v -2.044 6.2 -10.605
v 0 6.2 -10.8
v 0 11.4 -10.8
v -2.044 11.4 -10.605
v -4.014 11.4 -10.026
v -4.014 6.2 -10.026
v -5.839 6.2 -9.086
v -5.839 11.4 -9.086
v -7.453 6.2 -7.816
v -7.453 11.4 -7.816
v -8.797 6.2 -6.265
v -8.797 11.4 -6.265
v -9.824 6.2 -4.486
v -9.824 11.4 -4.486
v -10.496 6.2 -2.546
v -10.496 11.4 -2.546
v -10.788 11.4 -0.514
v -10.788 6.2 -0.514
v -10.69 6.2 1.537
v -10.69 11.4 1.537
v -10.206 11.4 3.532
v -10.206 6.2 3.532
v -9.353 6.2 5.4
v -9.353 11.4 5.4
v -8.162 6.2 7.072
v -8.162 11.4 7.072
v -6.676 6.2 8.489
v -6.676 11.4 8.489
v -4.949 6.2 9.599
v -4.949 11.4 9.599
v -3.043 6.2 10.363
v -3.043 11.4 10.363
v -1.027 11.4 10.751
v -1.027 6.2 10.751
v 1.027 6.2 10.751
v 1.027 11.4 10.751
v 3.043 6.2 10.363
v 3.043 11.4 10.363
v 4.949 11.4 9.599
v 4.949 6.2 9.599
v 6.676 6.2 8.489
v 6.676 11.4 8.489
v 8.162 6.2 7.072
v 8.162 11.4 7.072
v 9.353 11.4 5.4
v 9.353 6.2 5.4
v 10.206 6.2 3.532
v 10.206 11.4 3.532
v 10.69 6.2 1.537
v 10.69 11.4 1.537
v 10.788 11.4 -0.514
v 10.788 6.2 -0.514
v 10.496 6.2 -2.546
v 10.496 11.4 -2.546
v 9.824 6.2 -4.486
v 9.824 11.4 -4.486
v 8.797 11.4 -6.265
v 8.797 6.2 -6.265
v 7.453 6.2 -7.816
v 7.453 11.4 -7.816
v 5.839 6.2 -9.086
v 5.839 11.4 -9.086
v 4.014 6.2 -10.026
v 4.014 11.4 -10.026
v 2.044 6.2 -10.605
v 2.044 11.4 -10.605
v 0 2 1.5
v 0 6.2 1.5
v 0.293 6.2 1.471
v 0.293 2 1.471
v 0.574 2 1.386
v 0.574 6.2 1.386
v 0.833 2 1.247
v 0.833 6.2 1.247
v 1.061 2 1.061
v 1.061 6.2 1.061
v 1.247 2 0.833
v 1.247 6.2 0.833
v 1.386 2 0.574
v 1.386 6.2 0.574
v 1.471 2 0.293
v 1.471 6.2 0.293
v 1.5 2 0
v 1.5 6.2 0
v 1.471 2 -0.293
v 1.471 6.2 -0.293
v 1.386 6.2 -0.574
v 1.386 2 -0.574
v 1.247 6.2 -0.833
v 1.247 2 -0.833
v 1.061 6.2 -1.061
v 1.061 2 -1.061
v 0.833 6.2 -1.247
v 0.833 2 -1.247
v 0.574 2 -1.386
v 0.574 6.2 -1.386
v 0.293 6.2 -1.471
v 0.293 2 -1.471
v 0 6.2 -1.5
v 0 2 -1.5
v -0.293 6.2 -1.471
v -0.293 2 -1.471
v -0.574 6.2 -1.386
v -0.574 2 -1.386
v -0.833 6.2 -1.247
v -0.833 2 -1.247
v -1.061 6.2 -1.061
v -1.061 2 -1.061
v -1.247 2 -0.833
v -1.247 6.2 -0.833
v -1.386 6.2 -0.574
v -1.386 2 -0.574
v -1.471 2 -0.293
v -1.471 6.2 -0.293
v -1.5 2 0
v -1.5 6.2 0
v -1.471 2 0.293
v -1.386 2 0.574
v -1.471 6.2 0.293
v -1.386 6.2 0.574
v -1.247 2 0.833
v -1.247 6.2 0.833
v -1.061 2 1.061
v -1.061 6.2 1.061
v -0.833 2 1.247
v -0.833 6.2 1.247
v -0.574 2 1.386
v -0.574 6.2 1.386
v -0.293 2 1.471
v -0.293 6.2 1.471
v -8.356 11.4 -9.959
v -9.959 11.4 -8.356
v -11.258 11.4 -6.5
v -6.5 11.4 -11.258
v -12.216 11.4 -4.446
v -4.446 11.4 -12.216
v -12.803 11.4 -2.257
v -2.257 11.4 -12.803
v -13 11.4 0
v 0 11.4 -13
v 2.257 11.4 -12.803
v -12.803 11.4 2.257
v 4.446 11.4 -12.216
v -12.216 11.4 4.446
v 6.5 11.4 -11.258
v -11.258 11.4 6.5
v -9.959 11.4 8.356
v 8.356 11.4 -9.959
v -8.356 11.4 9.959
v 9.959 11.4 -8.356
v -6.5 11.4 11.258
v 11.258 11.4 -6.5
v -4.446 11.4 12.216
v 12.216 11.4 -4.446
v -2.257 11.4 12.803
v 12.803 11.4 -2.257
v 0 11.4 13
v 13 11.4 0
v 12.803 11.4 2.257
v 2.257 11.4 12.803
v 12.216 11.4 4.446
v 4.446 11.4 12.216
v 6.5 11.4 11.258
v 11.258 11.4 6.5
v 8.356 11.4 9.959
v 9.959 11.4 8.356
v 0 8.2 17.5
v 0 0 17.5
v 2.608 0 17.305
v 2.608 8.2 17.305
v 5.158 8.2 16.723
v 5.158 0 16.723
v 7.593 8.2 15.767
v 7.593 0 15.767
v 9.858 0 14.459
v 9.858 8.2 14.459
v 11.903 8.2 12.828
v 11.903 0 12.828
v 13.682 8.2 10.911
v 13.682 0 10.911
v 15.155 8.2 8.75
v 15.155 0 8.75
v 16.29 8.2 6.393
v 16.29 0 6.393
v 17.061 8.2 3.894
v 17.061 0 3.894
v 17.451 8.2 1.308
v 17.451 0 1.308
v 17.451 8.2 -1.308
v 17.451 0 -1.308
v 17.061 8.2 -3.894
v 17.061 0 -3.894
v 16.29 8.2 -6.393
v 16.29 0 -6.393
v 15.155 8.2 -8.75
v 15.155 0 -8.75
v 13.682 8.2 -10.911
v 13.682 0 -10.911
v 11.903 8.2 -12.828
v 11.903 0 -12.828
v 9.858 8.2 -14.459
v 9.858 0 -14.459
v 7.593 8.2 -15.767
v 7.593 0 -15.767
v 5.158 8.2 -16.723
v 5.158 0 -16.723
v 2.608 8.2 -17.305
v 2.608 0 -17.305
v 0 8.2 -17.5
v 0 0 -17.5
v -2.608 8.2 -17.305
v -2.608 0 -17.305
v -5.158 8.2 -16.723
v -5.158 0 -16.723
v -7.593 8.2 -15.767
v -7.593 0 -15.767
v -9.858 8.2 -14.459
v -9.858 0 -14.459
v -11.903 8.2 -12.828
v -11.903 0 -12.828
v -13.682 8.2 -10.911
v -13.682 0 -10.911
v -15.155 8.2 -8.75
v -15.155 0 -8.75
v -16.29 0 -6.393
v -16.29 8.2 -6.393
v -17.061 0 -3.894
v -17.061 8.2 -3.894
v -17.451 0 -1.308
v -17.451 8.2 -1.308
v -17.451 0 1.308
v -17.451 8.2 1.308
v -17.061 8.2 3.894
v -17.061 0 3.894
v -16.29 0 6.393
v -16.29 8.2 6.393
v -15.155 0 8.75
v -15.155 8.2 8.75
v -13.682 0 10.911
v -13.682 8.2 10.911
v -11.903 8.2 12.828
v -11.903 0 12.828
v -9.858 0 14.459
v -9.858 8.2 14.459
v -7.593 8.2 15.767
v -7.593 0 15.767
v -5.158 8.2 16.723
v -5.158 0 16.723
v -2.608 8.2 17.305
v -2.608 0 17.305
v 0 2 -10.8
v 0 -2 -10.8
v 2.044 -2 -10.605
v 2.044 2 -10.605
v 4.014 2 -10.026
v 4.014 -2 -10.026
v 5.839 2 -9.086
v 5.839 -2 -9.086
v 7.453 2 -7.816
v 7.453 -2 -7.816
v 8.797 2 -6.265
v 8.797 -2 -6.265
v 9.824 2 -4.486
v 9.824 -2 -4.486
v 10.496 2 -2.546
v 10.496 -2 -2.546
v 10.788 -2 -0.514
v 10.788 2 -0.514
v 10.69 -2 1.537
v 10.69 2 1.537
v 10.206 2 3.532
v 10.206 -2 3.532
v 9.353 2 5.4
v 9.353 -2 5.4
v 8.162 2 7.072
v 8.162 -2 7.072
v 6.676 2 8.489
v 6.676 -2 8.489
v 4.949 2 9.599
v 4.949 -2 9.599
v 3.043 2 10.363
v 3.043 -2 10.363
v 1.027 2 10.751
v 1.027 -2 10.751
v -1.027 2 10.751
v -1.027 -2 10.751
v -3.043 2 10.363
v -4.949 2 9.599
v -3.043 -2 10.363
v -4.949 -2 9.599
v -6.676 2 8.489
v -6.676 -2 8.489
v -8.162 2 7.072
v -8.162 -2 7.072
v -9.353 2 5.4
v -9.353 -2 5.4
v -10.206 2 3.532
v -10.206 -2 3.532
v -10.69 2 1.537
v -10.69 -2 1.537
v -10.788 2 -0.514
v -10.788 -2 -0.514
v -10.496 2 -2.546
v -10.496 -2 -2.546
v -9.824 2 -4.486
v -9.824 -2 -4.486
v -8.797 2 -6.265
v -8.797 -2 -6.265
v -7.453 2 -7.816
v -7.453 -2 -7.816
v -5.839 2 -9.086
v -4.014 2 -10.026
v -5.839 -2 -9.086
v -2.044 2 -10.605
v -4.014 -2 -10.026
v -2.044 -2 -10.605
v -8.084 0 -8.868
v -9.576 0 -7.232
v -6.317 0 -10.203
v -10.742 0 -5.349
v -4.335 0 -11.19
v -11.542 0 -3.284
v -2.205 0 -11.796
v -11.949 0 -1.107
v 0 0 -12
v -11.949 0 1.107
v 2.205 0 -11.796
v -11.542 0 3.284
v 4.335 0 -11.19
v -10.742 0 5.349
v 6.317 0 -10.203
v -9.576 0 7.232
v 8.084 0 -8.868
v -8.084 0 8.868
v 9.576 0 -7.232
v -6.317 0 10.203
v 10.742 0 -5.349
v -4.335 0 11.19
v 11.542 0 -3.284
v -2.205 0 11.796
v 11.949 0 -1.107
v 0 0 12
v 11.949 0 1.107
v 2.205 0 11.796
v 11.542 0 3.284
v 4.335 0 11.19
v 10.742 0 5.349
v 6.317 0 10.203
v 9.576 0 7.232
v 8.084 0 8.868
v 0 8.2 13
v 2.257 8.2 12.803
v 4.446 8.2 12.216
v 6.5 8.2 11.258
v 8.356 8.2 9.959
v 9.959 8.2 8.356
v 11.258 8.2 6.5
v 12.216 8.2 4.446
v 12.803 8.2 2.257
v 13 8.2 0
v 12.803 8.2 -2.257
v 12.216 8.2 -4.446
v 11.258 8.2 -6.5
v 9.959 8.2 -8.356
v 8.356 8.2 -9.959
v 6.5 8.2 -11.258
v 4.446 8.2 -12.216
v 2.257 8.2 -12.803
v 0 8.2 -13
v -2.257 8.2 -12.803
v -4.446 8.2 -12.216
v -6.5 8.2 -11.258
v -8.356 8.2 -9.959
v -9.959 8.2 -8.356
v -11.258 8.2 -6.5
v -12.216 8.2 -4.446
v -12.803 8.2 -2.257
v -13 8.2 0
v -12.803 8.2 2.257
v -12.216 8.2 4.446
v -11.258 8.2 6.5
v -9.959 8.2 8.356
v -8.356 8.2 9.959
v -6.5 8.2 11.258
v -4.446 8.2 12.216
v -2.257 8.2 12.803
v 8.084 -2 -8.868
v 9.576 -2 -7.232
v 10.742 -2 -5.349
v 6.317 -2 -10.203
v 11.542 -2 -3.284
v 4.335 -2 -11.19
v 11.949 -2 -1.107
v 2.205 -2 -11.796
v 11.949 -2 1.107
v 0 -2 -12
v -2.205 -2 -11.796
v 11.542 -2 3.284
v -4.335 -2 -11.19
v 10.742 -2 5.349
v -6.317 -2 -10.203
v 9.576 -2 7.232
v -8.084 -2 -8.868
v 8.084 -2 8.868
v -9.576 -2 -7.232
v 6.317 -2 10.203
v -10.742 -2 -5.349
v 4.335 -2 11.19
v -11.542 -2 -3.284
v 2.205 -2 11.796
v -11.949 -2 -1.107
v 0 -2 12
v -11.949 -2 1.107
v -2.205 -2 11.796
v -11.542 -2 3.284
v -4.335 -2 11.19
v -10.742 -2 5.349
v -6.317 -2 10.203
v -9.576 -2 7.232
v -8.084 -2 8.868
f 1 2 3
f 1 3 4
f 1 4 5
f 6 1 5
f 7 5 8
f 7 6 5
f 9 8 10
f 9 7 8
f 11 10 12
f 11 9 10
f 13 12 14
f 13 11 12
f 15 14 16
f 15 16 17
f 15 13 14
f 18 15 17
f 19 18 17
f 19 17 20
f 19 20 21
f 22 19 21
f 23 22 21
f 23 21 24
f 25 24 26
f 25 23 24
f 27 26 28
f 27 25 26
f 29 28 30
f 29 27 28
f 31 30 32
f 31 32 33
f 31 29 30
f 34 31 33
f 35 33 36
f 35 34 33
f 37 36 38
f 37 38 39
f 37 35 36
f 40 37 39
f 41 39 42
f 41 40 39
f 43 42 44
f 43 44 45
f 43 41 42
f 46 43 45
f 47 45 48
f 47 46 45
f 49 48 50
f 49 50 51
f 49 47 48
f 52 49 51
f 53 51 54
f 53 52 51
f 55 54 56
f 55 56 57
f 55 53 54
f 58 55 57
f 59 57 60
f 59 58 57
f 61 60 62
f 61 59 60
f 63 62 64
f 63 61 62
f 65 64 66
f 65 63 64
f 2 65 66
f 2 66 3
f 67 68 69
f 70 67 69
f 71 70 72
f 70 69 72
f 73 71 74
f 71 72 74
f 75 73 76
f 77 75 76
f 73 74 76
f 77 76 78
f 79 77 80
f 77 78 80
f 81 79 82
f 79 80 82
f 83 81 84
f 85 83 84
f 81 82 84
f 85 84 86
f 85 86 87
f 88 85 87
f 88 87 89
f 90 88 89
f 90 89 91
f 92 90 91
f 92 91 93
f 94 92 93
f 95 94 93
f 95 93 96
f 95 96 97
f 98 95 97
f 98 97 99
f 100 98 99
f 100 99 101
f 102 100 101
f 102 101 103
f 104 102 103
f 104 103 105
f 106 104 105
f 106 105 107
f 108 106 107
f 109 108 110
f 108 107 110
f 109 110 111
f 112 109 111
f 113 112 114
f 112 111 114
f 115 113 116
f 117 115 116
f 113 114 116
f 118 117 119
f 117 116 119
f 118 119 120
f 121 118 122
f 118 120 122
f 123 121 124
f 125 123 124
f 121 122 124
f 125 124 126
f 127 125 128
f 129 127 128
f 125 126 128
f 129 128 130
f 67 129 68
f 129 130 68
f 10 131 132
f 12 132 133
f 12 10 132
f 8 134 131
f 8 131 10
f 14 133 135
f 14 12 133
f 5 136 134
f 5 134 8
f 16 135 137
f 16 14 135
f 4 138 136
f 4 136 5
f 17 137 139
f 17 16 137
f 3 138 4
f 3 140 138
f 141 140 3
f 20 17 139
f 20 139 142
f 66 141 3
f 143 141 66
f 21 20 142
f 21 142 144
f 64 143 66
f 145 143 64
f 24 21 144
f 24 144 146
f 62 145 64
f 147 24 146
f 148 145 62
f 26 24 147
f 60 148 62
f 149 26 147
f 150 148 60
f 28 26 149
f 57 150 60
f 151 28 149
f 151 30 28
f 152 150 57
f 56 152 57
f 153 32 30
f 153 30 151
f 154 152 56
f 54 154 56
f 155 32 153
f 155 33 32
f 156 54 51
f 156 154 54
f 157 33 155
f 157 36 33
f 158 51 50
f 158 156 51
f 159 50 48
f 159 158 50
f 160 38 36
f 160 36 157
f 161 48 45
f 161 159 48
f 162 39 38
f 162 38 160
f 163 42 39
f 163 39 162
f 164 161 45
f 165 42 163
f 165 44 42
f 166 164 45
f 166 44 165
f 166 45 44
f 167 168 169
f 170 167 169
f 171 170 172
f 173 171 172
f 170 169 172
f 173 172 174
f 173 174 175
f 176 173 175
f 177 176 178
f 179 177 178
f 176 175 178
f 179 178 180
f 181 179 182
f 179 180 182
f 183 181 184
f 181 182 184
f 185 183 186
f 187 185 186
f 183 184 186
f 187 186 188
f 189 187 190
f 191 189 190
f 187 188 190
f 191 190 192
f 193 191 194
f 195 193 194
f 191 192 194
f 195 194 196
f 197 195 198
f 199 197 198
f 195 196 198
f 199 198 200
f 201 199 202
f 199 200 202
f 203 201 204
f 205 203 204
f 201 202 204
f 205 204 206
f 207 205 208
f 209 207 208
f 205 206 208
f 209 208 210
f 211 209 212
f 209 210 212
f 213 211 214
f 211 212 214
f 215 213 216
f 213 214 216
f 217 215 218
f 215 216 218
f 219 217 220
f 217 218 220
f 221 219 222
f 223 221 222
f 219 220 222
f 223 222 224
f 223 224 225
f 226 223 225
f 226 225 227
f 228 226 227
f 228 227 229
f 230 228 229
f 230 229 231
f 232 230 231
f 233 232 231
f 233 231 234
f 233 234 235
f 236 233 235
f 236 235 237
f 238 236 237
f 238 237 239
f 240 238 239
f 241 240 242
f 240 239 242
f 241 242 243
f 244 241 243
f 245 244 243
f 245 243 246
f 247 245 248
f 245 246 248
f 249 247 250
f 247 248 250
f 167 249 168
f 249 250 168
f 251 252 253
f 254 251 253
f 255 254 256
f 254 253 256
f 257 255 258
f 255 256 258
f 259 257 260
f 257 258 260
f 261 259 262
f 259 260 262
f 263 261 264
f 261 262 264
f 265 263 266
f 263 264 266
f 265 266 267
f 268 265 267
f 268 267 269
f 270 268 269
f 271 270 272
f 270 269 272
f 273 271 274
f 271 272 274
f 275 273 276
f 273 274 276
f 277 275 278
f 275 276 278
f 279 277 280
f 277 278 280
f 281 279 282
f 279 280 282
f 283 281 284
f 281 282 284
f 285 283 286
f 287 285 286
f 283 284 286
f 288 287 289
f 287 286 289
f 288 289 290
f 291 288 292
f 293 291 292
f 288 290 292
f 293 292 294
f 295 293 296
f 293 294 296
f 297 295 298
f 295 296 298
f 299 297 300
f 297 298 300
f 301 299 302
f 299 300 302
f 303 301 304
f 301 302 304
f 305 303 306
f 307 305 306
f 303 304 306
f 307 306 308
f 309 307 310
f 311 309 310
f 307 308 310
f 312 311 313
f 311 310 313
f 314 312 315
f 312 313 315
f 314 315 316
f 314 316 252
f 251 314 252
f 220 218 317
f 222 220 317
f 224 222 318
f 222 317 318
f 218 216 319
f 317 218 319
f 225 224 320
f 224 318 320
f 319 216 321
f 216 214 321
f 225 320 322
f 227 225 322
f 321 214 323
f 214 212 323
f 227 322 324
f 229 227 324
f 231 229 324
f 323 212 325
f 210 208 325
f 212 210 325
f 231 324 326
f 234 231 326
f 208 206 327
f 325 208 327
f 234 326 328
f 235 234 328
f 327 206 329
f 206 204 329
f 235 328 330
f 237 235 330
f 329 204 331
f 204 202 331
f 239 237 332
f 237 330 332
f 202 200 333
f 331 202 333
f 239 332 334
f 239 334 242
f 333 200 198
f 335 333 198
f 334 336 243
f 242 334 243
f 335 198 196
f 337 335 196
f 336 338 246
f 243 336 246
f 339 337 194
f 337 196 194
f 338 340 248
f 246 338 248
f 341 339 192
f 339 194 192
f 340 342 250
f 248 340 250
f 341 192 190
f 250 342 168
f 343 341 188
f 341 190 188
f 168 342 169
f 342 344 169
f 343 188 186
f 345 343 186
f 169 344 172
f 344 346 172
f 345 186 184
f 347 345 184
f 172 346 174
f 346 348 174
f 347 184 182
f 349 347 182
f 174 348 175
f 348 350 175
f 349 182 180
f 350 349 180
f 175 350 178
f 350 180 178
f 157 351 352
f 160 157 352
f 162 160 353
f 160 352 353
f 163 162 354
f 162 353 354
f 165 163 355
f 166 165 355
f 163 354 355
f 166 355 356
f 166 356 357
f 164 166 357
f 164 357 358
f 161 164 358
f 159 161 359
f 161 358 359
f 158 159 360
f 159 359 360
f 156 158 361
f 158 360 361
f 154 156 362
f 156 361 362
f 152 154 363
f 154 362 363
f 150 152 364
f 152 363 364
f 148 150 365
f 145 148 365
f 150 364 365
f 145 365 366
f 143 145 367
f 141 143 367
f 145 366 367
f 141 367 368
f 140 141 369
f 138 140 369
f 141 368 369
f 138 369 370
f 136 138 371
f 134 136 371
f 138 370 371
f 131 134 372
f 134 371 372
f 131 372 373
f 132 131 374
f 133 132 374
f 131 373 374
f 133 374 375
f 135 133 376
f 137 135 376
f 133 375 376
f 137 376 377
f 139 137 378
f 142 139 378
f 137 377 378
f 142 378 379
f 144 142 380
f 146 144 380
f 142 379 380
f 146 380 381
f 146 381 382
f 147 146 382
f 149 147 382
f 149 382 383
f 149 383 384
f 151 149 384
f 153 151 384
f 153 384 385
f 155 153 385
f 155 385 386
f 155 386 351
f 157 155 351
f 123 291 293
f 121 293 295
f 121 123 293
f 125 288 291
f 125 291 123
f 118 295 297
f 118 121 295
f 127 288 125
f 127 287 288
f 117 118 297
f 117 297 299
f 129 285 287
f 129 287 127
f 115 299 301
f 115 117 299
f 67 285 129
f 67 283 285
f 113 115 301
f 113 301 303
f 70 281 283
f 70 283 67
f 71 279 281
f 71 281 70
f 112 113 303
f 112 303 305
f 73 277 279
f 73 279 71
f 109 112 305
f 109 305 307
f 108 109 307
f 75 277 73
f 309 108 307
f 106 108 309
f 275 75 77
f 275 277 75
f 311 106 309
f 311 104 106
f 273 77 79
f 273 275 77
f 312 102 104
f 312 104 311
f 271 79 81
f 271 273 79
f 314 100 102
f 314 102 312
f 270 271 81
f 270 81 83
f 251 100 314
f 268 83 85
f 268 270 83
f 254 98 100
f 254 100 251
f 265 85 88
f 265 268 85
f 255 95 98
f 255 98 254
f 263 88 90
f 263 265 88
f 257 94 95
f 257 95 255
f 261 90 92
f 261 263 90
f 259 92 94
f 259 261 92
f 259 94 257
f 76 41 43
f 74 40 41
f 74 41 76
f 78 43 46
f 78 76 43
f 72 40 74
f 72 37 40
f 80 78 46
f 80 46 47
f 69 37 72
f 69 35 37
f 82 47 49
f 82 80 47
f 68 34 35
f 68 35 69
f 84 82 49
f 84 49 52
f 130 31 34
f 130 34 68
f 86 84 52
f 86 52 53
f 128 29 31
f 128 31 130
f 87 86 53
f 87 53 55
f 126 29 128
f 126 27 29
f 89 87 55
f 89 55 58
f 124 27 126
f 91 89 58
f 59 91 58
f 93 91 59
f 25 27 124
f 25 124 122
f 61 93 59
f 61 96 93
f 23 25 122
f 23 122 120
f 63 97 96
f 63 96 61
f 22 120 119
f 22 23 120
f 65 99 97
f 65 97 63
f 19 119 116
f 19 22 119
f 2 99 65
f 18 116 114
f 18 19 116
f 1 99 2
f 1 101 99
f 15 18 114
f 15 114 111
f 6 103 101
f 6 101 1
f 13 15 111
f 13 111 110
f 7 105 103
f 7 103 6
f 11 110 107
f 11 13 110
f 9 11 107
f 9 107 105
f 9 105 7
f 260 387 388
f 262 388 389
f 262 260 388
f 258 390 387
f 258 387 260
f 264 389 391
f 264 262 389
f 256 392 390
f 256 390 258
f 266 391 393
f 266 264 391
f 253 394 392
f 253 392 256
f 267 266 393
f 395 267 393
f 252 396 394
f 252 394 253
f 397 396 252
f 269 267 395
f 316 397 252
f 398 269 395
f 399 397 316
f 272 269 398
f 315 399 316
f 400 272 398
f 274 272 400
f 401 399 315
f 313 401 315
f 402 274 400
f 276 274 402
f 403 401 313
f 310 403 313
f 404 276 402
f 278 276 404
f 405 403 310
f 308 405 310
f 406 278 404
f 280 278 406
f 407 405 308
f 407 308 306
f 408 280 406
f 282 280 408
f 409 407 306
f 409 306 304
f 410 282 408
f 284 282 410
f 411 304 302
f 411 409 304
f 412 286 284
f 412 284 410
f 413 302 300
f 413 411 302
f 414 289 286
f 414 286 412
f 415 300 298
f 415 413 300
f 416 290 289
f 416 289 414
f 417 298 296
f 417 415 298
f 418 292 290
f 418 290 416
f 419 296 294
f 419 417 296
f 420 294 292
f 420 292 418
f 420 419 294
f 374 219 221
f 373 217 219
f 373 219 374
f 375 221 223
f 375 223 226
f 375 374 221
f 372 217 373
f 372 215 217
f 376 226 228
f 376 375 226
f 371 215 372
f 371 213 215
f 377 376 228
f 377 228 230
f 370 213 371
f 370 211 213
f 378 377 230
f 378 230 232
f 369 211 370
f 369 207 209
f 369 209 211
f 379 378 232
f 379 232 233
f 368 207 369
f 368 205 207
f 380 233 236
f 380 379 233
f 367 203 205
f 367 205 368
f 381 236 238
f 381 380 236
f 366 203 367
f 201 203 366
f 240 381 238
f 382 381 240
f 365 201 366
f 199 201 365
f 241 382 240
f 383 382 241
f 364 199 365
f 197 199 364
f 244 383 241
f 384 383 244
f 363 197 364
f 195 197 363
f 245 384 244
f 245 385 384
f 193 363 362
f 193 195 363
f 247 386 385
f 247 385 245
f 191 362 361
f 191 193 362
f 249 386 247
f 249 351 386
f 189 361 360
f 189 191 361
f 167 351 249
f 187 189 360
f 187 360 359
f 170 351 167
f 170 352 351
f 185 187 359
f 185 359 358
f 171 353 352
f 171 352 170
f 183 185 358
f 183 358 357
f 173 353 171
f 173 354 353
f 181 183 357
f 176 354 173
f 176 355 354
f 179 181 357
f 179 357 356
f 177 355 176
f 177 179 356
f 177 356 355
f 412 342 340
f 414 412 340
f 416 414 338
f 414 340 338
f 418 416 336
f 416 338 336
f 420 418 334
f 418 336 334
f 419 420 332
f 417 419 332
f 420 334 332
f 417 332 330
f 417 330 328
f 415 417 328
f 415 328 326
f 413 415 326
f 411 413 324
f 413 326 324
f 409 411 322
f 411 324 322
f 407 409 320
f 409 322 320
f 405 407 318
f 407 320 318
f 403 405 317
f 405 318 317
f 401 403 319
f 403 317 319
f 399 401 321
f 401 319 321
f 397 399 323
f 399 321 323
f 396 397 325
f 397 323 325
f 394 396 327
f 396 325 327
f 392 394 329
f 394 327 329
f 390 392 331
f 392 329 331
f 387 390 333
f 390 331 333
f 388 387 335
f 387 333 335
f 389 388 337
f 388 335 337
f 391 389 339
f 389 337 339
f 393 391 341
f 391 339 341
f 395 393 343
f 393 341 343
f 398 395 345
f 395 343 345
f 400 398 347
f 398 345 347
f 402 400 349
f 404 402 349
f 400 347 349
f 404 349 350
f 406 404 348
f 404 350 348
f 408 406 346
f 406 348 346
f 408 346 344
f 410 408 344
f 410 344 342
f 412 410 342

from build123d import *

# Parameters (mm, degrees)
SKETCH1_R           = 17.5
BOSS_EXTRUDE1_DEPTH = 8.2
SKETCH6_R           = 12
BOSS_EXTRUDE4_DEPTH = 2
SKETCH3_R           = 13
BOSS_EXTRUDE5_DEPTH = 3.2
SKETCH7_R           = 10.8
CUT_EXTRUDE3_DEPTH  = 4
CUT_EXTRUDE4_START  = -5.2
SKETCH8_R           = 10.8
CUT_EXTRUDE4_DEPTH  = 5.2
SKETCH9_R           = 1.5
CUT_EXTRUDE5_DEPTH  = 27.071823872


with BuildPart() as part:
    # Sketch1 → Boss-Extrude1 (new body)
    with BuildSketch(Plane(origin=(0, 0, 0), x_dir=(1, 0, 0), z_dir=(0, 1, 0))):
        with Locations(Location((0, 0, 0), (0, 0, 270))):
            Circle(SKETCH1_R)
    extrude(amount=BOSS_EXTRUDE1_DEPTH)

    # Sketch6 → Boss-Extrude4 (add)
    with BuildSketch(Plane.XZ):
        with Locations(Location((0, 0, 0), (0, 0, 90))):
            Circle(SKETCH6_R)
    extrude(amount=BOSS_EXTRUDE4_DEPTH)

    # Sketch3 → Boss-Extrude5 (add)
    with BuildSketch(Plane(origin=(0, 8.2, 0), x_dir=(1, 0, 0), z_dir=(0, 1, 0))):
        with Locations(Location((0, 0, 0), (0, 0, 270))):
            Circle(SKETCH3_R)
    extrude(amount=BOSS_EXTRUDE5_DEPTH)

    # Sketch7 → Cut-Extrude3 (cut)
    with BuildSketch(Plane.XZ.offset(2)):
        with Locations(Location((0, 0, 0), (0, 0, 270))):
            Circle(SKETCH7_R)
    extrude(amount=-CUT_EXTRUDE3_DEPTH, mode=Mode.SUBTRACT)

    # Sketch8 → Cut-Extrude4 (cut)
    with BuildSketch(Plane(origin=(0, 11.4, 0), x_dir=(1, 0, 0), z_dir=(0, 1, 0)).offset(CUT_EXTRUDE4_START)):
        with Locations(Location((0, 0, 0), (0, 0, 90))):
            Circle(SKETCH8_R)
    extrude(amount=CUT_EXTRUDE4_DEPTH, mode=Mode.SUBTRACT)

    # Sketch9 → Cut-Extrude5 (cut, through all)
    with BuildSketch(Plane(origin=(0, 6.2, 0), x_dir=(1, 0, 0), z_dir=(0, 1, 0))):
        with Locations(Location((0, 0, 0), (0, 0, 270))):
            Circle(SKETCH9_R)
    extrude(amount=-CUT_EXTRUDE5_DEPTH, mode=Mode.SUBTRACT)


solid = part.part
